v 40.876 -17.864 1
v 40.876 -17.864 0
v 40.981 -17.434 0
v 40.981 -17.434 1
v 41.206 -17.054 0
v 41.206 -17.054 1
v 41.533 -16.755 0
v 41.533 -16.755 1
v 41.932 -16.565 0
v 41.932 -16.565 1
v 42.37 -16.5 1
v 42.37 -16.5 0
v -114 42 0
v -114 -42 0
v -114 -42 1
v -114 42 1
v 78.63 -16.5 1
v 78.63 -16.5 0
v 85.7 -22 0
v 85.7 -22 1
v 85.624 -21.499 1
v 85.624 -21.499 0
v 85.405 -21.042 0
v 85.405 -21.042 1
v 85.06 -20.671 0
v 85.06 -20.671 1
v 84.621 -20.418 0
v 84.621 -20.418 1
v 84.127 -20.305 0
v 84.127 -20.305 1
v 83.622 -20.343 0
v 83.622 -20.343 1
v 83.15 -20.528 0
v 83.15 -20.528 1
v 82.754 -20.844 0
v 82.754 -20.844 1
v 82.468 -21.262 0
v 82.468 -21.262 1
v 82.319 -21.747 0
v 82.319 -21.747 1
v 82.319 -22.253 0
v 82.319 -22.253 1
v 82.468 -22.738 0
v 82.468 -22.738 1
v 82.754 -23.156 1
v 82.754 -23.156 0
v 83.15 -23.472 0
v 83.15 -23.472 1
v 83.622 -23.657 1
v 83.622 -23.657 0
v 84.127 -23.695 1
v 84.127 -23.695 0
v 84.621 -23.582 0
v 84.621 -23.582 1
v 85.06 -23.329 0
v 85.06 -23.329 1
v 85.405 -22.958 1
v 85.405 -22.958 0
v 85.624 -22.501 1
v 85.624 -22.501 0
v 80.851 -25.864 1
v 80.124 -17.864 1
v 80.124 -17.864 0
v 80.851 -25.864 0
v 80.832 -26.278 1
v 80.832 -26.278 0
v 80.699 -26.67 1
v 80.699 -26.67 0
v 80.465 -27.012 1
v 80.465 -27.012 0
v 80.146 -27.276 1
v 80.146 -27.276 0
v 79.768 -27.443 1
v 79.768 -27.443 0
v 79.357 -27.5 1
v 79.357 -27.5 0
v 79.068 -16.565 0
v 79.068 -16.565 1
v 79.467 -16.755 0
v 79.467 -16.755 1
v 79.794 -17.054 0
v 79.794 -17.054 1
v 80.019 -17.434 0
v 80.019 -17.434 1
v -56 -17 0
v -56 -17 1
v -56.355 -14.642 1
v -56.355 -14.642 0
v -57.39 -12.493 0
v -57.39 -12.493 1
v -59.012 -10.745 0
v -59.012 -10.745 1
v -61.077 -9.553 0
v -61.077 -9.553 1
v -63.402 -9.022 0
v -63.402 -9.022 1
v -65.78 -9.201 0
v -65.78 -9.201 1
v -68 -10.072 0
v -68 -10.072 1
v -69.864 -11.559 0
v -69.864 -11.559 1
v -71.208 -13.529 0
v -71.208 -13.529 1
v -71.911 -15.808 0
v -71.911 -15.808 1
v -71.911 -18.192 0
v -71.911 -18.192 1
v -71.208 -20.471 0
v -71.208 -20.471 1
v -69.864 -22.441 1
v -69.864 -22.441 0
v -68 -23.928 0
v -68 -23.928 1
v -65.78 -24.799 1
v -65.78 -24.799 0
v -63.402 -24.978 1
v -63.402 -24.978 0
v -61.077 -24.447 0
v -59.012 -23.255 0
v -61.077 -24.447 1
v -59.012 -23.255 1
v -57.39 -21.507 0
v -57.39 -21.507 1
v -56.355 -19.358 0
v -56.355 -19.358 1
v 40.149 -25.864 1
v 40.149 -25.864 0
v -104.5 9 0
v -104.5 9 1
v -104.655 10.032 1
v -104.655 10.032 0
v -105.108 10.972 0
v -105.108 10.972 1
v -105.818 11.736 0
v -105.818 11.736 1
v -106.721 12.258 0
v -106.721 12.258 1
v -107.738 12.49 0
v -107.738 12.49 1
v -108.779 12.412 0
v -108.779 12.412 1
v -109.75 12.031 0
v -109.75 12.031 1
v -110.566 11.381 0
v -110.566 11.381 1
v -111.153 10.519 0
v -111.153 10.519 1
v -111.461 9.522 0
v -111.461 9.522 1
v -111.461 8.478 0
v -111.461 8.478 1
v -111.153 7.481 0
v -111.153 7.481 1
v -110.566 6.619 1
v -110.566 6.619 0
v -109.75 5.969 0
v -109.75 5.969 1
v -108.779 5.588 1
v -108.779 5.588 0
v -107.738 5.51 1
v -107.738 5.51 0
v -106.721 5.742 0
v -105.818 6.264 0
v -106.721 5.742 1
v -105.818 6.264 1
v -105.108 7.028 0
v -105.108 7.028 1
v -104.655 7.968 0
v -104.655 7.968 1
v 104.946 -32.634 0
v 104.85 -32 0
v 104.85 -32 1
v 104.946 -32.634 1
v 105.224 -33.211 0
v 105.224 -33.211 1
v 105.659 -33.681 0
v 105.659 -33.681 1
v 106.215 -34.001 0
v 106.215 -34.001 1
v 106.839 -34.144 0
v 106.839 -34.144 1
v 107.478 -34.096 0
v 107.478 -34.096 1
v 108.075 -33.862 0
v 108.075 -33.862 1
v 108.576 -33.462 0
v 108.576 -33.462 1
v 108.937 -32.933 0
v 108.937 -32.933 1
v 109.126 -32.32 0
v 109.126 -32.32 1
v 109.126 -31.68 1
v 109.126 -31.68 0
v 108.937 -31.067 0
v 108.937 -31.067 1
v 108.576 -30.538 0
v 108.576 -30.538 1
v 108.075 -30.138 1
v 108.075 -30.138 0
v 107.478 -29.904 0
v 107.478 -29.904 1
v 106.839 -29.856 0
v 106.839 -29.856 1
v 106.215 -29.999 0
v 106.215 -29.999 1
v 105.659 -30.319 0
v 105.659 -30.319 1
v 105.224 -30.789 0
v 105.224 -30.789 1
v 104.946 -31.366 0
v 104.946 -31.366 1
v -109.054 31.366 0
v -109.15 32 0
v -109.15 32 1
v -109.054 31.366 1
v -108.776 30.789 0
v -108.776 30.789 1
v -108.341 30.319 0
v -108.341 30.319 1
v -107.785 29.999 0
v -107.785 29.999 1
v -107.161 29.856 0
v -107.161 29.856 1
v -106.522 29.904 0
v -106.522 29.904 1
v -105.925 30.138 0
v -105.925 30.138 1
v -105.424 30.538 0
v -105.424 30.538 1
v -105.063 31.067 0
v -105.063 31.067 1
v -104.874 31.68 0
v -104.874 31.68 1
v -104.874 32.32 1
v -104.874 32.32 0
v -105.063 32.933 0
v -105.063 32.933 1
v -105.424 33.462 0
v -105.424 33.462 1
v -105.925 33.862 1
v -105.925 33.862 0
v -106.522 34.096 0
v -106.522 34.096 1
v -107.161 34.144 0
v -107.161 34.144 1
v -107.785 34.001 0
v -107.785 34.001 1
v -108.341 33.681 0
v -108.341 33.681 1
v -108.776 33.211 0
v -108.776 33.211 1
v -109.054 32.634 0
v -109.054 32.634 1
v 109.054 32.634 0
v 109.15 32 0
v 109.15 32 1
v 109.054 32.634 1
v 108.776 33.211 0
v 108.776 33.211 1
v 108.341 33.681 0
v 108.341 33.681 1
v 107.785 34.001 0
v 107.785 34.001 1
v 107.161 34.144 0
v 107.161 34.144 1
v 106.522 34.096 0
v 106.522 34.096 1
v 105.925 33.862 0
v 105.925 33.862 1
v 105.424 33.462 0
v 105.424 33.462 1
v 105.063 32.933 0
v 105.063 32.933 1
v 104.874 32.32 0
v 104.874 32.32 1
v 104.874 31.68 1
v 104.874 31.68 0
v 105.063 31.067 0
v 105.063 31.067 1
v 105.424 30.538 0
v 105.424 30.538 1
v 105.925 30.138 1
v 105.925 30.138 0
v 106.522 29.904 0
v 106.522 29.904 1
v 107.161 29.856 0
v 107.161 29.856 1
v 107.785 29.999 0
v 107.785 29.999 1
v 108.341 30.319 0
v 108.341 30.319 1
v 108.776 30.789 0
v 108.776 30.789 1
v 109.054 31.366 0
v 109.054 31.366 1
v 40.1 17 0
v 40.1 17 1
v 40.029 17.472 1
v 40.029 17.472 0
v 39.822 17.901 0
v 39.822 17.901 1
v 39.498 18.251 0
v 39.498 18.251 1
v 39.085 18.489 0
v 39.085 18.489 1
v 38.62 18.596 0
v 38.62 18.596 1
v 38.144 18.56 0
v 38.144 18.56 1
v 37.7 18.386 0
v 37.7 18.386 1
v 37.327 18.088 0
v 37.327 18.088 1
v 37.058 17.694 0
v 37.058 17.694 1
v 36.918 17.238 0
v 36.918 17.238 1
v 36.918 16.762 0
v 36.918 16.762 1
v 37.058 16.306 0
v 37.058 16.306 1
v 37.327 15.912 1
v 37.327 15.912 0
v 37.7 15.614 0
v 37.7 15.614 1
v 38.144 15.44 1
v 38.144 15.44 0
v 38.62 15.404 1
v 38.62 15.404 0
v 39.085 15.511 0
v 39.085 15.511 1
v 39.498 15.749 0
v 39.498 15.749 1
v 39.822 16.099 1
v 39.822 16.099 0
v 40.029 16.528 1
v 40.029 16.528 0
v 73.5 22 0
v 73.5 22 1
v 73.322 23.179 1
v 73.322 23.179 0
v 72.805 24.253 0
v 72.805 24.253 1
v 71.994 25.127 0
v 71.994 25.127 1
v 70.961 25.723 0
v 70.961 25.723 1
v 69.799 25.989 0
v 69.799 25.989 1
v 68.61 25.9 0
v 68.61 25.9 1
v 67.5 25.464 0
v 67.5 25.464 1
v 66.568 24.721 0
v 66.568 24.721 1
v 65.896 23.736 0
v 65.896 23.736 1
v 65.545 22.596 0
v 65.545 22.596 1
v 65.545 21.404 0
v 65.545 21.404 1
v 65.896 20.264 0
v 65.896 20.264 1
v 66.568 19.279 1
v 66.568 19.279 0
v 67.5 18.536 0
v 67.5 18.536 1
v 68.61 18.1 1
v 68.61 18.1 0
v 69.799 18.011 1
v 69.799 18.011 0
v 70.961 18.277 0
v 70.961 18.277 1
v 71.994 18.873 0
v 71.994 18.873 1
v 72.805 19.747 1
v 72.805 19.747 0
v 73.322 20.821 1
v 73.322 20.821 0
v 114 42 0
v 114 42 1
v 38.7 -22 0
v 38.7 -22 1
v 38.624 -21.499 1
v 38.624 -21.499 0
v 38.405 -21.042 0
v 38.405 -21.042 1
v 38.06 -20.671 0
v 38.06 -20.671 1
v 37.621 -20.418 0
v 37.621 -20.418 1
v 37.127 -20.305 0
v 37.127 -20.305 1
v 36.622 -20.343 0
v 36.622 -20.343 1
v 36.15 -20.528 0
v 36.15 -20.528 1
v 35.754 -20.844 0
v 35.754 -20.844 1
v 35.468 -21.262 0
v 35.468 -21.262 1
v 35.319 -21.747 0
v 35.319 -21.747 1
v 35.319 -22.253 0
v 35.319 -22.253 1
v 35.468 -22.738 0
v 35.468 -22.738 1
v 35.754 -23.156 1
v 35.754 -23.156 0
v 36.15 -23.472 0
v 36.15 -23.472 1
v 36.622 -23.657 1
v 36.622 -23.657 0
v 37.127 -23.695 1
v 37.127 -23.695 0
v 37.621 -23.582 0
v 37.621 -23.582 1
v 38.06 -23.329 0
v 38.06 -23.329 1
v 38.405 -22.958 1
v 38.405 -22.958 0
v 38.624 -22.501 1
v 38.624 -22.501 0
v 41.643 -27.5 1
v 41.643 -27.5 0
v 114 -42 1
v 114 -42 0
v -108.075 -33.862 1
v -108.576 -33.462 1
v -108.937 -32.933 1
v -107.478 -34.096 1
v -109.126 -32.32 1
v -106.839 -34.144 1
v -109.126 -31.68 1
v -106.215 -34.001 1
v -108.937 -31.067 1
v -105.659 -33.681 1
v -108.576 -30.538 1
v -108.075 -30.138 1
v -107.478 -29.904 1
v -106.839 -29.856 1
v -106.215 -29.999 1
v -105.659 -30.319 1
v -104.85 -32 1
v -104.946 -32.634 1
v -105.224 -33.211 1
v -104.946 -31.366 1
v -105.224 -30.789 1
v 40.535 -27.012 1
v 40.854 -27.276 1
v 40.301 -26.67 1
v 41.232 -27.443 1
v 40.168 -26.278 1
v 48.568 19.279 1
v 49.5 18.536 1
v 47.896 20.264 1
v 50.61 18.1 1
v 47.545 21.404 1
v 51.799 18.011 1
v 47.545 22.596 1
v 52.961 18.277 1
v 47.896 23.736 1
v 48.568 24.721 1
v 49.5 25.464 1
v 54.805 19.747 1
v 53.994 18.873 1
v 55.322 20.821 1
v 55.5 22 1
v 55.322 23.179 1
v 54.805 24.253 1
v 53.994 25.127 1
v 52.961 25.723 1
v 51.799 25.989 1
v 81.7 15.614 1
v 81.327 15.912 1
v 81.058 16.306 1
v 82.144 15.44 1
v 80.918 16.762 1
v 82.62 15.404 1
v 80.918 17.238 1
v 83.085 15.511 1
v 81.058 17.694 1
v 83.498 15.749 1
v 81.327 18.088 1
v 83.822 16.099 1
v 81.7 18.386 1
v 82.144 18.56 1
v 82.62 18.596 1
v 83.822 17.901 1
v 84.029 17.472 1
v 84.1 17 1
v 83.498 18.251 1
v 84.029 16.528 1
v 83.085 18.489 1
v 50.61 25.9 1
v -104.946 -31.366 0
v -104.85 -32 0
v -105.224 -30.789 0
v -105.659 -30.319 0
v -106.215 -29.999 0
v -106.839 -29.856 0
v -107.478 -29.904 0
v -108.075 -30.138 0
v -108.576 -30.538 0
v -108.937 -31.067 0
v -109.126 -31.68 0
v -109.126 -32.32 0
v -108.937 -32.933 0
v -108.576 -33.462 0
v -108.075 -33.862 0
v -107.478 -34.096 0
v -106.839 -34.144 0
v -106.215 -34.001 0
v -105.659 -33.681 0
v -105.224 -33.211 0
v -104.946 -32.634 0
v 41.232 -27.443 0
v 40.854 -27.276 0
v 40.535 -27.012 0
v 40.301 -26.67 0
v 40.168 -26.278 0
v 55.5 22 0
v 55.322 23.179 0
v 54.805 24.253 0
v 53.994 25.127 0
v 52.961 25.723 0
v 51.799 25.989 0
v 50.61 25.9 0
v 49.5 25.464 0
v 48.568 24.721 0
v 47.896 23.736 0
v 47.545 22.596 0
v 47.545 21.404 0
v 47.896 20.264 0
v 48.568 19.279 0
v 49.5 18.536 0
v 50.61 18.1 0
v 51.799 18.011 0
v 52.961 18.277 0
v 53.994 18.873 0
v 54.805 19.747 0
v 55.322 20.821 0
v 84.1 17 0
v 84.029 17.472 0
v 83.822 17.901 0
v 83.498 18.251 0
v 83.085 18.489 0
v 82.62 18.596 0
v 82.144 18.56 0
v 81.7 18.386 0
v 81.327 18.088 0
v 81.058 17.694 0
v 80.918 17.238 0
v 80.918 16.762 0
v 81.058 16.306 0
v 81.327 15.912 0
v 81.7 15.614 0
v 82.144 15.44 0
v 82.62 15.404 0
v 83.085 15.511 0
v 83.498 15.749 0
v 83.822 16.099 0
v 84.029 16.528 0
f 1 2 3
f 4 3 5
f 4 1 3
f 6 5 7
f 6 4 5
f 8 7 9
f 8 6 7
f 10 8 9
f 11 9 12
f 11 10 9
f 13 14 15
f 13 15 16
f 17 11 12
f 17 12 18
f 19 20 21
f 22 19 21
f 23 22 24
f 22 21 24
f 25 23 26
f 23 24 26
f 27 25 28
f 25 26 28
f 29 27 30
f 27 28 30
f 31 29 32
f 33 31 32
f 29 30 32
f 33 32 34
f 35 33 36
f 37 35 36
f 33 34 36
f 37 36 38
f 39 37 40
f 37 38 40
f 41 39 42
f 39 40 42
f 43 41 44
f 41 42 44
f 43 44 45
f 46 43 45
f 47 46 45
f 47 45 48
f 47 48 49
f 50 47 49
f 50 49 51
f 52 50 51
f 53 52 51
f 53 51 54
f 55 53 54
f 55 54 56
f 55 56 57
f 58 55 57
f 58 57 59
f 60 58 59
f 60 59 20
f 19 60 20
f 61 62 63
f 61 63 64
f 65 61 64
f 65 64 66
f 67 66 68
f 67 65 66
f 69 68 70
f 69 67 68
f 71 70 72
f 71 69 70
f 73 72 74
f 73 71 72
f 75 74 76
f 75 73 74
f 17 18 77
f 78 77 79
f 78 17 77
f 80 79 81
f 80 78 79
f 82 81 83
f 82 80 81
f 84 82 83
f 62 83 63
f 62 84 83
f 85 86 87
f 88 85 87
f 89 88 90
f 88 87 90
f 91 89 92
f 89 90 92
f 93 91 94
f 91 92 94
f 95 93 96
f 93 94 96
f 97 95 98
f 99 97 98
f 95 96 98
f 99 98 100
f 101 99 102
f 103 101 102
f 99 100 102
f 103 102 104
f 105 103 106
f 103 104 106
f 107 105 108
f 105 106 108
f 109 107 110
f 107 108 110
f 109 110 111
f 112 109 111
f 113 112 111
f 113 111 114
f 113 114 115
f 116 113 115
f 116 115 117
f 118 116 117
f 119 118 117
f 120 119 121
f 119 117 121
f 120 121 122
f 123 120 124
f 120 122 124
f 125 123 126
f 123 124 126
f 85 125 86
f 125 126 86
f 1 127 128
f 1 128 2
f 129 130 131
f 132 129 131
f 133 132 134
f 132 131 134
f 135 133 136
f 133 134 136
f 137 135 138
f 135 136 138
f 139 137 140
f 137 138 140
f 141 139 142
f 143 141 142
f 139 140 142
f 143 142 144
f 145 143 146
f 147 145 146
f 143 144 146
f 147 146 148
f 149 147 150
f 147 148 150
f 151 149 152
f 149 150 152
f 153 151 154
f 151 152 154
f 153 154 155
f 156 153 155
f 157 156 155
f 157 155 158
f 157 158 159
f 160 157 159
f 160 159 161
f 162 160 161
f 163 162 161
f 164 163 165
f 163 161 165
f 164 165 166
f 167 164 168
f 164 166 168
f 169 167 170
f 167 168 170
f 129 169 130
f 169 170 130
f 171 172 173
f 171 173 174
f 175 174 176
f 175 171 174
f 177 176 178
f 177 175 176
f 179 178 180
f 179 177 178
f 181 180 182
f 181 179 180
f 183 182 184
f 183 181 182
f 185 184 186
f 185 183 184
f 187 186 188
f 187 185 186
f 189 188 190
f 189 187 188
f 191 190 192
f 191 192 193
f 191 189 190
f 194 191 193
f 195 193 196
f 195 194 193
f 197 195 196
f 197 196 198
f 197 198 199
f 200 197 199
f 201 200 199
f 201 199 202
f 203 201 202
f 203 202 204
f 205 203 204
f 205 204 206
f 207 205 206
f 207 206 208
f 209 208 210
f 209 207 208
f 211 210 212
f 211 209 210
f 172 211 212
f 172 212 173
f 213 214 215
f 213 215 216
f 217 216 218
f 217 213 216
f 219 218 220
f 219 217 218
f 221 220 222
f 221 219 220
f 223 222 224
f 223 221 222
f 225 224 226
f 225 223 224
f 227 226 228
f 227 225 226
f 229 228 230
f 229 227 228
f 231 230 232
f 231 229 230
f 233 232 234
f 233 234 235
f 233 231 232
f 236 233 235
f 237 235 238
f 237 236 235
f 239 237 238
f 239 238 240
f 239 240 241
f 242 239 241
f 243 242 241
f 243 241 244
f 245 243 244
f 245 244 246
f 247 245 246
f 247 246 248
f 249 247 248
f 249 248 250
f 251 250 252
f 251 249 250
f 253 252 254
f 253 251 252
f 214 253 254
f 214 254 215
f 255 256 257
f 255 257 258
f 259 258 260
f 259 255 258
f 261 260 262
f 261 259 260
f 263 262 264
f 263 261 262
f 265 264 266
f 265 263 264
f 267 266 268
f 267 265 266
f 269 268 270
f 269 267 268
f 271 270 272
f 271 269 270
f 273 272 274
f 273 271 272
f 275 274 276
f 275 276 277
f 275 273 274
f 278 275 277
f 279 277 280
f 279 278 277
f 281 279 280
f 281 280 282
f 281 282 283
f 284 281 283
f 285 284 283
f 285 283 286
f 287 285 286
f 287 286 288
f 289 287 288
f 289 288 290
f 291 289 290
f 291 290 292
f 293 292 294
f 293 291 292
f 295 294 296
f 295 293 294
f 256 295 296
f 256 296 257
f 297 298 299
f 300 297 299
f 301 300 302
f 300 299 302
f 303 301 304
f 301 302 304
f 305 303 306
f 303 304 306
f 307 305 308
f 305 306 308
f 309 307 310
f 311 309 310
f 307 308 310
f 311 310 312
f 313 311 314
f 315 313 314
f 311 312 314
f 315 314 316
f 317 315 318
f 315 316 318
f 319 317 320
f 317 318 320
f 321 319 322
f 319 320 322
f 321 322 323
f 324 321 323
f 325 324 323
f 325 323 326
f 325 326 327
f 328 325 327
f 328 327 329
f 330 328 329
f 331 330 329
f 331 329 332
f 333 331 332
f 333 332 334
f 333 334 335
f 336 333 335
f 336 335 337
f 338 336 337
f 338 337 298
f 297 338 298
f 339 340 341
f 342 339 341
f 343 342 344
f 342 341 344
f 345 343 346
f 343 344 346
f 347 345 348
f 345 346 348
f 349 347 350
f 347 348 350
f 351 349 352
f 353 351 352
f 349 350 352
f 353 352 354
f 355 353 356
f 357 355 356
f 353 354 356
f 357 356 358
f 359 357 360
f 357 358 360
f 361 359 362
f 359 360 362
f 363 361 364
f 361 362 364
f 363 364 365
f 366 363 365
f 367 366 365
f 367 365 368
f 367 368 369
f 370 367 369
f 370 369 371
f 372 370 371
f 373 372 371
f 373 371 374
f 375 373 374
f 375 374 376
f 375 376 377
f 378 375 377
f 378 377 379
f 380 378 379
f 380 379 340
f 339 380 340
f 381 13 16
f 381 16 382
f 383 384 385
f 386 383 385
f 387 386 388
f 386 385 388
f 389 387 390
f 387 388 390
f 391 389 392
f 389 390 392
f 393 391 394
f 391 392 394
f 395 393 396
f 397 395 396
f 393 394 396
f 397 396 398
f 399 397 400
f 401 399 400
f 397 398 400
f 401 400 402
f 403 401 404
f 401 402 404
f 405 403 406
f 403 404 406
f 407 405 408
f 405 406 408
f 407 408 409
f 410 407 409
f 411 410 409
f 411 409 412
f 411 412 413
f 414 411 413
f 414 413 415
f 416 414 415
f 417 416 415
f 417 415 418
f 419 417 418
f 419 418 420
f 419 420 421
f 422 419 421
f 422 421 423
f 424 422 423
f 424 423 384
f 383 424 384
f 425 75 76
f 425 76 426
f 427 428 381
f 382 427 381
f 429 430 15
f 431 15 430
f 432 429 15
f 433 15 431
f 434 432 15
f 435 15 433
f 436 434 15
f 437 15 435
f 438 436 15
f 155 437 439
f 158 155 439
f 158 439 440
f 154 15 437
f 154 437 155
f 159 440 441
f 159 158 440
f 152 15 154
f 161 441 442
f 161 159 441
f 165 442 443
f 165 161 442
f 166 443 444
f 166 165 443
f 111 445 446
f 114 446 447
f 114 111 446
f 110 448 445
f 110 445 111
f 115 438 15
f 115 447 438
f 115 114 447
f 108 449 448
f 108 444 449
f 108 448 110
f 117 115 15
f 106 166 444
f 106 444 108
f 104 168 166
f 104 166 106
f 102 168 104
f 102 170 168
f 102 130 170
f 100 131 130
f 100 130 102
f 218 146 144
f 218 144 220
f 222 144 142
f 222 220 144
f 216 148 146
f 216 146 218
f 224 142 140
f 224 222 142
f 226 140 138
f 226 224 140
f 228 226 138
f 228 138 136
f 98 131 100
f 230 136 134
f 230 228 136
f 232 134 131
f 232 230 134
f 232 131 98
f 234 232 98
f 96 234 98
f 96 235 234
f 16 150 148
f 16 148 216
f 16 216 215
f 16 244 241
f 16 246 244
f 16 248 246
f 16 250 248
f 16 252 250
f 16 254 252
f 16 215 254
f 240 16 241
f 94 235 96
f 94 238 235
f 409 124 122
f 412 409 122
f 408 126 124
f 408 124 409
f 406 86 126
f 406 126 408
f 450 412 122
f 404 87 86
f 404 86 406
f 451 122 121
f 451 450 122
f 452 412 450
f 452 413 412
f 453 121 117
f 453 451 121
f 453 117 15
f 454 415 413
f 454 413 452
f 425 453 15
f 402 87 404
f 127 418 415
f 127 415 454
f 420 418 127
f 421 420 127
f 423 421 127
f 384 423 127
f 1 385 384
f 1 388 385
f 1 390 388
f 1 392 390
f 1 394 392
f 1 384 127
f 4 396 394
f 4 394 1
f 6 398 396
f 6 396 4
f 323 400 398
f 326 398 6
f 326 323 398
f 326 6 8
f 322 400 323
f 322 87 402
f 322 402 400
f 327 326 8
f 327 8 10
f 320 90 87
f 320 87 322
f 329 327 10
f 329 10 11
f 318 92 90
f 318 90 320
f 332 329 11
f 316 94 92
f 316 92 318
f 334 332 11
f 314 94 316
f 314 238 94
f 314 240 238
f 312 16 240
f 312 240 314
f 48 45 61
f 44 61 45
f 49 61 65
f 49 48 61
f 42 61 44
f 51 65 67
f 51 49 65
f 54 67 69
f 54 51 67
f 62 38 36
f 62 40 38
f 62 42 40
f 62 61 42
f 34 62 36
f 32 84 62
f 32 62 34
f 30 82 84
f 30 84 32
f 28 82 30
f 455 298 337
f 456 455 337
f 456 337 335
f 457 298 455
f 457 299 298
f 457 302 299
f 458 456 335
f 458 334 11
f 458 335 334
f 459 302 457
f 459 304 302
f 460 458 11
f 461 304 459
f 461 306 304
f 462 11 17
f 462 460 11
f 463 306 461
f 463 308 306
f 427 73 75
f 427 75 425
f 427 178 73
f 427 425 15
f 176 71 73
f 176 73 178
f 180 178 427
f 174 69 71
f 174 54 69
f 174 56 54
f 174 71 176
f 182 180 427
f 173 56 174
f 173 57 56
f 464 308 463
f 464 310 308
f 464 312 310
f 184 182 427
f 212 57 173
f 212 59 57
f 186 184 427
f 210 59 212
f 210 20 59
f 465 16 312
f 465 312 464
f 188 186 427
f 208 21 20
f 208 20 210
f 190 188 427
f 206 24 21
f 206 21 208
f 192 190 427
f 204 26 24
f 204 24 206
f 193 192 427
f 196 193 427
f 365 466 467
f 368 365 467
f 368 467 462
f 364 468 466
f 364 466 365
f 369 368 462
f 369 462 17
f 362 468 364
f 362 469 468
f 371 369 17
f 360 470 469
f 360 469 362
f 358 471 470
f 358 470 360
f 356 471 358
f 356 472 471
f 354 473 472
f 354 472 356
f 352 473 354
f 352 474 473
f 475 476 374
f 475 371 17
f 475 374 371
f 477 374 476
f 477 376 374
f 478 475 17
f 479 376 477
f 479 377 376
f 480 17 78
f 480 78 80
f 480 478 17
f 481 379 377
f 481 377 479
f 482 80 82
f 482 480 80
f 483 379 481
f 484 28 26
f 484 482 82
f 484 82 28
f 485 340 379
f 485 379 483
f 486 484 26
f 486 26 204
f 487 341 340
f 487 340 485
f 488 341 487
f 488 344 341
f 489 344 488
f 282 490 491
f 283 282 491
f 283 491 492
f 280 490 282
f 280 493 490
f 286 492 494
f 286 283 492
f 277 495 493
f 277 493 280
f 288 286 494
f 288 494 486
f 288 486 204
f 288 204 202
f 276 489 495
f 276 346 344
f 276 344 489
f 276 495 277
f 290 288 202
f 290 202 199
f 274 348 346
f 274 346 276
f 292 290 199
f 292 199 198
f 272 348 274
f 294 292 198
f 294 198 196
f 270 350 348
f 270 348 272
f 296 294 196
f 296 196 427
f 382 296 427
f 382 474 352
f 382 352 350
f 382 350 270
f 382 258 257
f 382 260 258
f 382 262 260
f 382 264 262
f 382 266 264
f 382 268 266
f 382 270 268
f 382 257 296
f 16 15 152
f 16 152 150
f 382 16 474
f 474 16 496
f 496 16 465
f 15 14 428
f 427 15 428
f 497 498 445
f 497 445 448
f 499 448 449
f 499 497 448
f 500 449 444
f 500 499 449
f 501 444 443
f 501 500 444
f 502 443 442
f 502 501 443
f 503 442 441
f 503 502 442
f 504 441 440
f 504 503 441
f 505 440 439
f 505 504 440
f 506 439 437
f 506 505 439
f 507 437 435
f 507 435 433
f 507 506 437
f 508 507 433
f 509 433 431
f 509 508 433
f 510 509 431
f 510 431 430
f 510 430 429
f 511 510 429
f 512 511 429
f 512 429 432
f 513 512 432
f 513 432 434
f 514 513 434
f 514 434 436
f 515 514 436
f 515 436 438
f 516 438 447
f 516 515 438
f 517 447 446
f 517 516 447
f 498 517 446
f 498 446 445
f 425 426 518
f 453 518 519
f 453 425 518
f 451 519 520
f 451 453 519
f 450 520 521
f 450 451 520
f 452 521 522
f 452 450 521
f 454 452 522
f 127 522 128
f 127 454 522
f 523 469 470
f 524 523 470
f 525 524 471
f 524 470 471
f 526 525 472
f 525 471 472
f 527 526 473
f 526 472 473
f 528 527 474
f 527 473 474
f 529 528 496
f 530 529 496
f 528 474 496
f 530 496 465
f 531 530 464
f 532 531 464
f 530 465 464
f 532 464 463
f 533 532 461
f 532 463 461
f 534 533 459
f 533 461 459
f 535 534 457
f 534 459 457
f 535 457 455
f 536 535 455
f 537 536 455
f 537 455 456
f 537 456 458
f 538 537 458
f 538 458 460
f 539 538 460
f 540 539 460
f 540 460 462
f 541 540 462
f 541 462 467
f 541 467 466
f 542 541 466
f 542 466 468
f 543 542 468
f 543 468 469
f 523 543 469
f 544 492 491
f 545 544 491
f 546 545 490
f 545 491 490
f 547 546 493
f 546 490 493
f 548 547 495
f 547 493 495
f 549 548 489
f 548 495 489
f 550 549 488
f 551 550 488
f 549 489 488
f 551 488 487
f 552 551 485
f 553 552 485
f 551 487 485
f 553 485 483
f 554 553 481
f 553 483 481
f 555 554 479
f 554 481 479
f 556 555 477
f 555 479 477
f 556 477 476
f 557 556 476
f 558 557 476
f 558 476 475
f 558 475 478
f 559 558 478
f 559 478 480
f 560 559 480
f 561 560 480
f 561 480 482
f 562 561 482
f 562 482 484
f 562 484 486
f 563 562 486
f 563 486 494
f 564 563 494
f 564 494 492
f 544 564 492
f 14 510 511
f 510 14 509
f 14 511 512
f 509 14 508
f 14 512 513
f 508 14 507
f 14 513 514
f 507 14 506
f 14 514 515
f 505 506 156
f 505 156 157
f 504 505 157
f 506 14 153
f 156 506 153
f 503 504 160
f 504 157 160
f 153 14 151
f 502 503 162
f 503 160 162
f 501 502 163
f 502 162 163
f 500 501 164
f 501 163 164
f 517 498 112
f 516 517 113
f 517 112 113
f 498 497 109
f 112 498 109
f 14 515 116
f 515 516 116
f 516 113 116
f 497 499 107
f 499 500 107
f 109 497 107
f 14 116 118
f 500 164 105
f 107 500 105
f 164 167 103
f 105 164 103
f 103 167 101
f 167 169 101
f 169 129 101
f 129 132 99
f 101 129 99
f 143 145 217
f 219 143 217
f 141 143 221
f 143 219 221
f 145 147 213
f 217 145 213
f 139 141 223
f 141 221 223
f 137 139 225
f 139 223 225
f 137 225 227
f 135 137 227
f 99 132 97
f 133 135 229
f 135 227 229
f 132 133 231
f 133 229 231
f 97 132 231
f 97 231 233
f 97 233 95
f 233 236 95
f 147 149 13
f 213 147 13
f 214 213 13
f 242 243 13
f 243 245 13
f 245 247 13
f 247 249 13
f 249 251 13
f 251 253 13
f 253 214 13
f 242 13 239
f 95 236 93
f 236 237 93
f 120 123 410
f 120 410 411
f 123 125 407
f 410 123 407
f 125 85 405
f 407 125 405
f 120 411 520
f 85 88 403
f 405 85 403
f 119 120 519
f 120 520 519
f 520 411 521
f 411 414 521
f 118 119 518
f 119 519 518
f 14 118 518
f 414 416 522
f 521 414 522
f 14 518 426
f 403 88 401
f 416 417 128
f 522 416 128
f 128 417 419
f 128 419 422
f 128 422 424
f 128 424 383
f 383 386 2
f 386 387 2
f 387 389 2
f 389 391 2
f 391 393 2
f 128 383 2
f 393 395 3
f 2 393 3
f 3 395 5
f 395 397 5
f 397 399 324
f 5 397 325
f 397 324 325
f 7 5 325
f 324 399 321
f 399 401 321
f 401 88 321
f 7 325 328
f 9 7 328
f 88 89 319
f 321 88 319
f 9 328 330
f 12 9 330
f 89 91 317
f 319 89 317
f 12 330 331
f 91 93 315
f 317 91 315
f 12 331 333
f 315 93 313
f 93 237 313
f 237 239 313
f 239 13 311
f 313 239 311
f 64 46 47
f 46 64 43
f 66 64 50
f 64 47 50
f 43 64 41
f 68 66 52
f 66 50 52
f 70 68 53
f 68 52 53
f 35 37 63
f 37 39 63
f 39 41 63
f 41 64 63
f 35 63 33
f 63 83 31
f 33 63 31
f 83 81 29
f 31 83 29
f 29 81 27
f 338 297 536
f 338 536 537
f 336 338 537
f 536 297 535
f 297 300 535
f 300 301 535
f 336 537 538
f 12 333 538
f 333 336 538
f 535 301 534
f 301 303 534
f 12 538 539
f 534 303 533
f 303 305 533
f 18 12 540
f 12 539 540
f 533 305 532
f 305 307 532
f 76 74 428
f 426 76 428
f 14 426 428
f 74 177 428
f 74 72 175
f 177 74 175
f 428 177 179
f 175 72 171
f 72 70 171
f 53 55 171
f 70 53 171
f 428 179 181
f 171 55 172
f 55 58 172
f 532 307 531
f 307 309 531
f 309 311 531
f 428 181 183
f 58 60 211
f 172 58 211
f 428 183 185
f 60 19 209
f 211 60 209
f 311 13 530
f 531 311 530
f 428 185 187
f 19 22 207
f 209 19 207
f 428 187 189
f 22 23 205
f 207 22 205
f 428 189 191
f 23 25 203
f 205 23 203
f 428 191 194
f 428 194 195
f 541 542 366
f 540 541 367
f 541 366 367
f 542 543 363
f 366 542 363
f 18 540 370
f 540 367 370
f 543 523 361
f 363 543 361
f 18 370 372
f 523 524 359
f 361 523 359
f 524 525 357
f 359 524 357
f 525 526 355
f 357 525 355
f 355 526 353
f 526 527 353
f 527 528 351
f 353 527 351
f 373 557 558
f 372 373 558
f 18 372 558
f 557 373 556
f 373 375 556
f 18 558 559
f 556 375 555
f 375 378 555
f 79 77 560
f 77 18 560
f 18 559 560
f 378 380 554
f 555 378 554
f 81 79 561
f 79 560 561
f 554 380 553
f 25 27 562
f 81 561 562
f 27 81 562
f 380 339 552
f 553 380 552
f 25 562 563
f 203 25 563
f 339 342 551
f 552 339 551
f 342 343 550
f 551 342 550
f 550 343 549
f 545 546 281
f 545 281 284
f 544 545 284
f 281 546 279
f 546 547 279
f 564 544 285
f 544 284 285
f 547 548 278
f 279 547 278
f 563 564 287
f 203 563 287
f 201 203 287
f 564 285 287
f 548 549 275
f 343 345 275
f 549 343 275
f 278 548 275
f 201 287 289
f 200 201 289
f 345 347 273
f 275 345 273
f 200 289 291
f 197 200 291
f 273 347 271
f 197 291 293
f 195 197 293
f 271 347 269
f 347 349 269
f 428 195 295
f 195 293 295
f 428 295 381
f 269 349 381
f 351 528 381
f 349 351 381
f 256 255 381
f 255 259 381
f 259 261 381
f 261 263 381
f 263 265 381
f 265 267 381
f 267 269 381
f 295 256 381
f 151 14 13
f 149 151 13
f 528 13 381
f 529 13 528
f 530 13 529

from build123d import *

# Parameters (mm, degrees)
SKETCH_1_W          = 228
SKETCH_1_H          = 84
SKETCH_1_R          = 2.15
EXTRUDE_1_DEPTH     = 1
SKETCH_3_R          = 1.7
SKETCH_3_R_2        = 1.6
SKETCH_3_R_3        = 4
CUT_EXTRUDE_1_DEPTH = 10
SKETCH_4_R          = 3.5
SKETCH_4_R_2        = 8
CUT_EXTRUDE_2_DEPTH = 1


with BuildPart() as part:
    # Эскиз1 → Вытянуть1 (new body)
    with BuildSketch(Plane.XY):
        Rectangle(SKETCH_1_W, SKETCH_1_H)
        with Locations((107, 32)):
            Circle(SKETCH_1_R, mode=Mode.SUBTRACT)
        with Locations(Location((-107, 32, 0), (0, 0, 180))):
            Circle(SKETCH_1_R, mode=Mode.SUBTRACT)
        with Locations((-107, -32)):
            Circle(SKETCH_1_R, mode=Mode.SUBTRACT)
        with Locations(Location((107, -32, 0), (0, 0, 180))):
            Circle(SKETCH_1_R, mode=Mode.SUBTRACT)
    extrude(amount=EXTRUDE_1_DEPTH)

    # Эскиз3 → Вырез-Вытянуть1 (cut)
    with BuildSketch(Plane.XY.offset(1)):
        with Locations((37, -22)):
            Circle(SKETCH_3_R)
        with Locations((84, -22)):
            Circle(SKETCH_3_R)
        with Locations((38.5, 17)):
            Circle(SKETCH_3_R_2)
        with Locations((82.5, 17)):
            Circle(SKETCH_3_R_2)
        with Locations((51.5, 22)):
            Circle(SKETCH_3_R_3)
        with Locations((69.5, 22)):
            Circle(SKETCH_3_R_3)
        with BuildLine():
            Line((40.14870942, -25.864196381), (40.875982147, -17.864196381))
            ThreePointArc((40.875982147, -17.864196381), (41.358314525, -16.892366164), (42.369821957, -16.5))
            Line((42.369821957, -16.5), (78.630178043, -16.5))
            ThreePointArc((78.630178043, -16.5), (79.641685475, -16.892366164), (80.124017853, -17.864196381))
            Line((80.124017853, -17.864196381), (80.85129058, -25.864196381))
            ThreePointArc((80.85129058, -25.864196381), (80.465084606, -27.011507432), (79.35745077, -27.5))
            Line((79.35745077, -27.5), (41.64254923, -27.5))
            ThreePointArc((41.64254923, -27.5), (40.534915394, -27.011507432), (40.14870942, -25.864196381))
        make_face()
    extrude(amount=-CUT_EXTRUDE_1_DEPTH, mode=Mode.SUBTRACT)

    # Эскиз4 → Вырез-Вытянуть2 (cut)
    with BuildSketch(Plane.XY.offset(1)):
        with Locations((-108, 9)):
            Circle(SKETCH_4_R)
        with Locations((-64, -17)):
            Circle(SKETCH_4_R_2)
    extrude(amount=-CUT_EXTRUDE_2_DEPTH, mode=Mode.SUBTRACT)


solid = part.part
